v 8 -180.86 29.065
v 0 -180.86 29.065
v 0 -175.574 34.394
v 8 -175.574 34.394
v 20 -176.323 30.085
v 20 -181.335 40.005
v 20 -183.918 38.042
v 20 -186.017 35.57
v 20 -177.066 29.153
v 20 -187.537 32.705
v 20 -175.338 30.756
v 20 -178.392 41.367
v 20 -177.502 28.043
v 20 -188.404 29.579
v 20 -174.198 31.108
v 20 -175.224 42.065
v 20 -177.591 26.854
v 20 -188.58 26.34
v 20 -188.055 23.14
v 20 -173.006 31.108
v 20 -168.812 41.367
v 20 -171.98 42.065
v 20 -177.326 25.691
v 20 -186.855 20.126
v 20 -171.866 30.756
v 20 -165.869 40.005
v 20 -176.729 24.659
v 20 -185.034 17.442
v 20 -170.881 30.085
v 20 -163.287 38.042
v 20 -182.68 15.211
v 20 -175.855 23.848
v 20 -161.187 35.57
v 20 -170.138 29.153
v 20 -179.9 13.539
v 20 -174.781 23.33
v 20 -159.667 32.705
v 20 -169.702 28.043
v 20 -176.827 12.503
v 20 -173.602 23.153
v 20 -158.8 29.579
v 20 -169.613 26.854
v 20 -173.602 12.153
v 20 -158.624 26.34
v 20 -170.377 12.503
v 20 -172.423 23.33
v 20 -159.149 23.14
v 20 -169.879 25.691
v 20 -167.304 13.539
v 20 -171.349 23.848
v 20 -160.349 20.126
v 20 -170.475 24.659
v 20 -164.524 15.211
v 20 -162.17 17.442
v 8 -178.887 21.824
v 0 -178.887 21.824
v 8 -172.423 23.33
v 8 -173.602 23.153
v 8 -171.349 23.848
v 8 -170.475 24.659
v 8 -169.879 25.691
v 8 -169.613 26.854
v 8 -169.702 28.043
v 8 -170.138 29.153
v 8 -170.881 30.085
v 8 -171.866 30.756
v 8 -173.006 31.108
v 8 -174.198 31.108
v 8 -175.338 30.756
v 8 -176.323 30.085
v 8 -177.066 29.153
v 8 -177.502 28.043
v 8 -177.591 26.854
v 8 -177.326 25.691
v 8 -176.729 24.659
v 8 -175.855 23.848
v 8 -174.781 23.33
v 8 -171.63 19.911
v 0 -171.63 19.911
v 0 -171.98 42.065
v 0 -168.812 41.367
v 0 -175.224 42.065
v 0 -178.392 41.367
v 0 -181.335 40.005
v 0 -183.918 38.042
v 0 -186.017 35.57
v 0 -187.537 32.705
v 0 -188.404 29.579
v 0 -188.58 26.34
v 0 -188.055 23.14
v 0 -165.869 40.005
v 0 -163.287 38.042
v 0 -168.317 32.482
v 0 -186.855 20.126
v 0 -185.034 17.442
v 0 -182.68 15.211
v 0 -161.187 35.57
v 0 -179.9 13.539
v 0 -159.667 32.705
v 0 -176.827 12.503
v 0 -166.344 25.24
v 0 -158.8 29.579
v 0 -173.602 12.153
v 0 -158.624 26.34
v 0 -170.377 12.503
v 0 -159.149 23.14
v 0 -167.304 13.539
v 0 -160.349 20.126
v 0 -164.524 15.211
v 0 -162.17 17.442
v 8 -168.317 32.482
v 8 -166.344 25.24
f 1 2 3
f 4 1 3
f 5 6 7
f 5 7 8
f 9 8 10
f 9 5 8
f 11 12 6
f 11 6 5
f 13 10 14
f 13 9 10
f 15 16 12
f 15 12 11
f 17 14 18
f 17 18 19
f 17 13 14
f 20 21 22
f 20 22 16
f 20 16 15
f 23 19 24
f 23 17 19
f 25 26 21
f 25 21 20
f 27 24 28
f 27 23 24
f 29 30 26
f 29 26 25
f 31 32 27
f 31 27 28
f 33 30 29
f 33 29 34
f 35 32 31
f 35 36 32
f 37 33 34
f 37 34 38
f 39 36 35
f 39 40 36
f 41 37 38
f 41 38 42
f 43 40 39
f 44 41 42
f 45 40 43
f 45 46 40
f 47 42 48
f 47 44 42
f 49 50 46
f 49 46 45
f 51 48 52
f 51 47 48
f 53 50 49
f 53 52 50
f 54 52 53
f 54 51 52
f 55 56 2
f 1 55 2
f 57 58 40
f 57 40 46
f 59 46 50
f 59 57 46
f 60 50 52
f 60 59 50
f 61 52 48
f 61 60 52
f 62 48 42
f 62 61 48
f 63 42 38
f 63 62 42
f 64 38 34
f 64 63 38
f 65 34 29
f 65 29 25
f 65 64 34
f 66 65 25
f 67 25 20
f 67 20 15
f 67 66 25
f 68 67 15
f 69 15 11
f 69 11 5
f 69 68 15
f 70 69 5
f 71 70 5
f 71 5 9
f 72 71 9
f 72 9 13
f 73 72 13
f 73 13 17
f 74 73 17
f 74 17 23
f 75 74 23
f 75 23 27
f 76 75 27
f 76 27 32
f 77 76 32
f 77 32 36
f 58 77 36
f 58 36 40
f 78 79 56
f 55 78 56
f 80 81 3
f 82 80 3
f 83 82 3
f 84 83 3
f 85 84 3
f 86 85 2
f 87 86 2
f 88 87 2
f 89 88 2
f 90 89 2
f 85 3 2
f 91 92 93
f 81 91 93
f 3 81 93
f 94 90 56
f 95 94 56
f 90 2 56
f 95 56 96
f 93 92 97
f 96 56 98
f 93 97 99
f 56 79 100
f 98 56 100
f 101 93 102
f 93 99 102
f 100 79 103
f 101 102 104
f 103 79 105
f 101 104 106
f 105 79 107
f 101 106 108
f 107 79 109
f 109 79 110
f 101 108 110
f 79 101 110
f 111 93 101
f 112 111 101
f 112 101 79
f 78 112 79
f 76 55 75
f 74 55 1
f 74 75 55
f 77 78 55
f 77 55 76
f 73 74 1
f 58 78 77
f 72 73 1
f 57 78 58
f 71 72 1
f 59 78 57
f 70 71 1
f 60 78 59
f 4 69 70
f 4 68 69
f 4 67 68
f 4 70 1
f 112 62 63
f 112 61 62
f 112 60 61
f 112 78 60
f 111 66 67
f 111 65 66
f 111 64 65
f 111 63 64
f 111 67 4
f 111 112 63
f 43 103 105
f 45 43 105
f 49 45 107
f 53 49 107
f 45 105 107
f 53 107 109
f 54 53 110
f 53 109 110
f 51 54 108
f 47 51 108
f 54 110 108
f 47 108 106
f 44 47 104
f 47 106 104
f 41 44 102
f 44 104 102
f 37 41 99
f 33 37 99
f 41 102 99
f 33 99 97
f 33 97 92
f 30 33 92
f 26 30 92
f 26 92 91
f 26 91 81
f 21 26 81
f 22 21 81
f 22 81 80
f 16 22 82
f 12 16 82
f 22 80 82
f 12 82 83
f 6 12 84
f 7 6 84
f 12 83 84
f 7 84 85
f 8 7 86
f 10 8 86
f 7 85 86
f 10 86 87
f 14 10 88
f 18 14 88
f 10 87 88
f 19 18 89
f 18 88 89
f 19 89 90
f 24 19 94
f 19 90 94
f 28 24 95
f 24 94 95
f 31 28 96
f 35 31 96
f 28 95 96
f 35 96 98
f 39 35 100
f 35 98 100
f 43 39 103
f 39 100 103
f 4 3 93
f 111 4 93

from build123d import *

# Parameters (mm, degrees)
ESQUISSE1_R             = 15
ESQUISSE1_R_2           = 4
BOSS_EXTRU_1_DEPTH      = 20
ENL_V_MAT_EXTRU_1_DEPTH = 8


with BuildPart() as part:
    # Esquisse1 → Boss.-Extru.1 (new body)
    with BuildSketch(Plane(origin=(0, 0, 0), x_dir=(0, 0, -1), z_dir=(1, 0, 0))):
        with Locations((-27.152557625, -173.602016712)):
            Circle(ESQUISSE1_R)
        with Locations((-27.152557625, -173.602016712)):
            Circle(ESQUISSE1_R_2, mode=Mode.SUBTRACT)
    extrude(amount=BOSS_EXTRU_1_DEPTH)

    # Esquisse2 → Enlèv. mat.-Extru.1 (cut)
    with BuildSketch(Plane.ZY):
        Polygon((21.82354936, -178.887374244), (29.065307384, -180.859752013), (34.394315649, -175.57439448), (32.48156589, -168.31665918), (25.239807867, -166.344281411), (19.910799602, -171.629638944), align=None)
    extrude(amount=-ENL_V_MAT_EXTRU_1_DEPTH, mode=Mode.SUBTRACT)


solid = part.part
